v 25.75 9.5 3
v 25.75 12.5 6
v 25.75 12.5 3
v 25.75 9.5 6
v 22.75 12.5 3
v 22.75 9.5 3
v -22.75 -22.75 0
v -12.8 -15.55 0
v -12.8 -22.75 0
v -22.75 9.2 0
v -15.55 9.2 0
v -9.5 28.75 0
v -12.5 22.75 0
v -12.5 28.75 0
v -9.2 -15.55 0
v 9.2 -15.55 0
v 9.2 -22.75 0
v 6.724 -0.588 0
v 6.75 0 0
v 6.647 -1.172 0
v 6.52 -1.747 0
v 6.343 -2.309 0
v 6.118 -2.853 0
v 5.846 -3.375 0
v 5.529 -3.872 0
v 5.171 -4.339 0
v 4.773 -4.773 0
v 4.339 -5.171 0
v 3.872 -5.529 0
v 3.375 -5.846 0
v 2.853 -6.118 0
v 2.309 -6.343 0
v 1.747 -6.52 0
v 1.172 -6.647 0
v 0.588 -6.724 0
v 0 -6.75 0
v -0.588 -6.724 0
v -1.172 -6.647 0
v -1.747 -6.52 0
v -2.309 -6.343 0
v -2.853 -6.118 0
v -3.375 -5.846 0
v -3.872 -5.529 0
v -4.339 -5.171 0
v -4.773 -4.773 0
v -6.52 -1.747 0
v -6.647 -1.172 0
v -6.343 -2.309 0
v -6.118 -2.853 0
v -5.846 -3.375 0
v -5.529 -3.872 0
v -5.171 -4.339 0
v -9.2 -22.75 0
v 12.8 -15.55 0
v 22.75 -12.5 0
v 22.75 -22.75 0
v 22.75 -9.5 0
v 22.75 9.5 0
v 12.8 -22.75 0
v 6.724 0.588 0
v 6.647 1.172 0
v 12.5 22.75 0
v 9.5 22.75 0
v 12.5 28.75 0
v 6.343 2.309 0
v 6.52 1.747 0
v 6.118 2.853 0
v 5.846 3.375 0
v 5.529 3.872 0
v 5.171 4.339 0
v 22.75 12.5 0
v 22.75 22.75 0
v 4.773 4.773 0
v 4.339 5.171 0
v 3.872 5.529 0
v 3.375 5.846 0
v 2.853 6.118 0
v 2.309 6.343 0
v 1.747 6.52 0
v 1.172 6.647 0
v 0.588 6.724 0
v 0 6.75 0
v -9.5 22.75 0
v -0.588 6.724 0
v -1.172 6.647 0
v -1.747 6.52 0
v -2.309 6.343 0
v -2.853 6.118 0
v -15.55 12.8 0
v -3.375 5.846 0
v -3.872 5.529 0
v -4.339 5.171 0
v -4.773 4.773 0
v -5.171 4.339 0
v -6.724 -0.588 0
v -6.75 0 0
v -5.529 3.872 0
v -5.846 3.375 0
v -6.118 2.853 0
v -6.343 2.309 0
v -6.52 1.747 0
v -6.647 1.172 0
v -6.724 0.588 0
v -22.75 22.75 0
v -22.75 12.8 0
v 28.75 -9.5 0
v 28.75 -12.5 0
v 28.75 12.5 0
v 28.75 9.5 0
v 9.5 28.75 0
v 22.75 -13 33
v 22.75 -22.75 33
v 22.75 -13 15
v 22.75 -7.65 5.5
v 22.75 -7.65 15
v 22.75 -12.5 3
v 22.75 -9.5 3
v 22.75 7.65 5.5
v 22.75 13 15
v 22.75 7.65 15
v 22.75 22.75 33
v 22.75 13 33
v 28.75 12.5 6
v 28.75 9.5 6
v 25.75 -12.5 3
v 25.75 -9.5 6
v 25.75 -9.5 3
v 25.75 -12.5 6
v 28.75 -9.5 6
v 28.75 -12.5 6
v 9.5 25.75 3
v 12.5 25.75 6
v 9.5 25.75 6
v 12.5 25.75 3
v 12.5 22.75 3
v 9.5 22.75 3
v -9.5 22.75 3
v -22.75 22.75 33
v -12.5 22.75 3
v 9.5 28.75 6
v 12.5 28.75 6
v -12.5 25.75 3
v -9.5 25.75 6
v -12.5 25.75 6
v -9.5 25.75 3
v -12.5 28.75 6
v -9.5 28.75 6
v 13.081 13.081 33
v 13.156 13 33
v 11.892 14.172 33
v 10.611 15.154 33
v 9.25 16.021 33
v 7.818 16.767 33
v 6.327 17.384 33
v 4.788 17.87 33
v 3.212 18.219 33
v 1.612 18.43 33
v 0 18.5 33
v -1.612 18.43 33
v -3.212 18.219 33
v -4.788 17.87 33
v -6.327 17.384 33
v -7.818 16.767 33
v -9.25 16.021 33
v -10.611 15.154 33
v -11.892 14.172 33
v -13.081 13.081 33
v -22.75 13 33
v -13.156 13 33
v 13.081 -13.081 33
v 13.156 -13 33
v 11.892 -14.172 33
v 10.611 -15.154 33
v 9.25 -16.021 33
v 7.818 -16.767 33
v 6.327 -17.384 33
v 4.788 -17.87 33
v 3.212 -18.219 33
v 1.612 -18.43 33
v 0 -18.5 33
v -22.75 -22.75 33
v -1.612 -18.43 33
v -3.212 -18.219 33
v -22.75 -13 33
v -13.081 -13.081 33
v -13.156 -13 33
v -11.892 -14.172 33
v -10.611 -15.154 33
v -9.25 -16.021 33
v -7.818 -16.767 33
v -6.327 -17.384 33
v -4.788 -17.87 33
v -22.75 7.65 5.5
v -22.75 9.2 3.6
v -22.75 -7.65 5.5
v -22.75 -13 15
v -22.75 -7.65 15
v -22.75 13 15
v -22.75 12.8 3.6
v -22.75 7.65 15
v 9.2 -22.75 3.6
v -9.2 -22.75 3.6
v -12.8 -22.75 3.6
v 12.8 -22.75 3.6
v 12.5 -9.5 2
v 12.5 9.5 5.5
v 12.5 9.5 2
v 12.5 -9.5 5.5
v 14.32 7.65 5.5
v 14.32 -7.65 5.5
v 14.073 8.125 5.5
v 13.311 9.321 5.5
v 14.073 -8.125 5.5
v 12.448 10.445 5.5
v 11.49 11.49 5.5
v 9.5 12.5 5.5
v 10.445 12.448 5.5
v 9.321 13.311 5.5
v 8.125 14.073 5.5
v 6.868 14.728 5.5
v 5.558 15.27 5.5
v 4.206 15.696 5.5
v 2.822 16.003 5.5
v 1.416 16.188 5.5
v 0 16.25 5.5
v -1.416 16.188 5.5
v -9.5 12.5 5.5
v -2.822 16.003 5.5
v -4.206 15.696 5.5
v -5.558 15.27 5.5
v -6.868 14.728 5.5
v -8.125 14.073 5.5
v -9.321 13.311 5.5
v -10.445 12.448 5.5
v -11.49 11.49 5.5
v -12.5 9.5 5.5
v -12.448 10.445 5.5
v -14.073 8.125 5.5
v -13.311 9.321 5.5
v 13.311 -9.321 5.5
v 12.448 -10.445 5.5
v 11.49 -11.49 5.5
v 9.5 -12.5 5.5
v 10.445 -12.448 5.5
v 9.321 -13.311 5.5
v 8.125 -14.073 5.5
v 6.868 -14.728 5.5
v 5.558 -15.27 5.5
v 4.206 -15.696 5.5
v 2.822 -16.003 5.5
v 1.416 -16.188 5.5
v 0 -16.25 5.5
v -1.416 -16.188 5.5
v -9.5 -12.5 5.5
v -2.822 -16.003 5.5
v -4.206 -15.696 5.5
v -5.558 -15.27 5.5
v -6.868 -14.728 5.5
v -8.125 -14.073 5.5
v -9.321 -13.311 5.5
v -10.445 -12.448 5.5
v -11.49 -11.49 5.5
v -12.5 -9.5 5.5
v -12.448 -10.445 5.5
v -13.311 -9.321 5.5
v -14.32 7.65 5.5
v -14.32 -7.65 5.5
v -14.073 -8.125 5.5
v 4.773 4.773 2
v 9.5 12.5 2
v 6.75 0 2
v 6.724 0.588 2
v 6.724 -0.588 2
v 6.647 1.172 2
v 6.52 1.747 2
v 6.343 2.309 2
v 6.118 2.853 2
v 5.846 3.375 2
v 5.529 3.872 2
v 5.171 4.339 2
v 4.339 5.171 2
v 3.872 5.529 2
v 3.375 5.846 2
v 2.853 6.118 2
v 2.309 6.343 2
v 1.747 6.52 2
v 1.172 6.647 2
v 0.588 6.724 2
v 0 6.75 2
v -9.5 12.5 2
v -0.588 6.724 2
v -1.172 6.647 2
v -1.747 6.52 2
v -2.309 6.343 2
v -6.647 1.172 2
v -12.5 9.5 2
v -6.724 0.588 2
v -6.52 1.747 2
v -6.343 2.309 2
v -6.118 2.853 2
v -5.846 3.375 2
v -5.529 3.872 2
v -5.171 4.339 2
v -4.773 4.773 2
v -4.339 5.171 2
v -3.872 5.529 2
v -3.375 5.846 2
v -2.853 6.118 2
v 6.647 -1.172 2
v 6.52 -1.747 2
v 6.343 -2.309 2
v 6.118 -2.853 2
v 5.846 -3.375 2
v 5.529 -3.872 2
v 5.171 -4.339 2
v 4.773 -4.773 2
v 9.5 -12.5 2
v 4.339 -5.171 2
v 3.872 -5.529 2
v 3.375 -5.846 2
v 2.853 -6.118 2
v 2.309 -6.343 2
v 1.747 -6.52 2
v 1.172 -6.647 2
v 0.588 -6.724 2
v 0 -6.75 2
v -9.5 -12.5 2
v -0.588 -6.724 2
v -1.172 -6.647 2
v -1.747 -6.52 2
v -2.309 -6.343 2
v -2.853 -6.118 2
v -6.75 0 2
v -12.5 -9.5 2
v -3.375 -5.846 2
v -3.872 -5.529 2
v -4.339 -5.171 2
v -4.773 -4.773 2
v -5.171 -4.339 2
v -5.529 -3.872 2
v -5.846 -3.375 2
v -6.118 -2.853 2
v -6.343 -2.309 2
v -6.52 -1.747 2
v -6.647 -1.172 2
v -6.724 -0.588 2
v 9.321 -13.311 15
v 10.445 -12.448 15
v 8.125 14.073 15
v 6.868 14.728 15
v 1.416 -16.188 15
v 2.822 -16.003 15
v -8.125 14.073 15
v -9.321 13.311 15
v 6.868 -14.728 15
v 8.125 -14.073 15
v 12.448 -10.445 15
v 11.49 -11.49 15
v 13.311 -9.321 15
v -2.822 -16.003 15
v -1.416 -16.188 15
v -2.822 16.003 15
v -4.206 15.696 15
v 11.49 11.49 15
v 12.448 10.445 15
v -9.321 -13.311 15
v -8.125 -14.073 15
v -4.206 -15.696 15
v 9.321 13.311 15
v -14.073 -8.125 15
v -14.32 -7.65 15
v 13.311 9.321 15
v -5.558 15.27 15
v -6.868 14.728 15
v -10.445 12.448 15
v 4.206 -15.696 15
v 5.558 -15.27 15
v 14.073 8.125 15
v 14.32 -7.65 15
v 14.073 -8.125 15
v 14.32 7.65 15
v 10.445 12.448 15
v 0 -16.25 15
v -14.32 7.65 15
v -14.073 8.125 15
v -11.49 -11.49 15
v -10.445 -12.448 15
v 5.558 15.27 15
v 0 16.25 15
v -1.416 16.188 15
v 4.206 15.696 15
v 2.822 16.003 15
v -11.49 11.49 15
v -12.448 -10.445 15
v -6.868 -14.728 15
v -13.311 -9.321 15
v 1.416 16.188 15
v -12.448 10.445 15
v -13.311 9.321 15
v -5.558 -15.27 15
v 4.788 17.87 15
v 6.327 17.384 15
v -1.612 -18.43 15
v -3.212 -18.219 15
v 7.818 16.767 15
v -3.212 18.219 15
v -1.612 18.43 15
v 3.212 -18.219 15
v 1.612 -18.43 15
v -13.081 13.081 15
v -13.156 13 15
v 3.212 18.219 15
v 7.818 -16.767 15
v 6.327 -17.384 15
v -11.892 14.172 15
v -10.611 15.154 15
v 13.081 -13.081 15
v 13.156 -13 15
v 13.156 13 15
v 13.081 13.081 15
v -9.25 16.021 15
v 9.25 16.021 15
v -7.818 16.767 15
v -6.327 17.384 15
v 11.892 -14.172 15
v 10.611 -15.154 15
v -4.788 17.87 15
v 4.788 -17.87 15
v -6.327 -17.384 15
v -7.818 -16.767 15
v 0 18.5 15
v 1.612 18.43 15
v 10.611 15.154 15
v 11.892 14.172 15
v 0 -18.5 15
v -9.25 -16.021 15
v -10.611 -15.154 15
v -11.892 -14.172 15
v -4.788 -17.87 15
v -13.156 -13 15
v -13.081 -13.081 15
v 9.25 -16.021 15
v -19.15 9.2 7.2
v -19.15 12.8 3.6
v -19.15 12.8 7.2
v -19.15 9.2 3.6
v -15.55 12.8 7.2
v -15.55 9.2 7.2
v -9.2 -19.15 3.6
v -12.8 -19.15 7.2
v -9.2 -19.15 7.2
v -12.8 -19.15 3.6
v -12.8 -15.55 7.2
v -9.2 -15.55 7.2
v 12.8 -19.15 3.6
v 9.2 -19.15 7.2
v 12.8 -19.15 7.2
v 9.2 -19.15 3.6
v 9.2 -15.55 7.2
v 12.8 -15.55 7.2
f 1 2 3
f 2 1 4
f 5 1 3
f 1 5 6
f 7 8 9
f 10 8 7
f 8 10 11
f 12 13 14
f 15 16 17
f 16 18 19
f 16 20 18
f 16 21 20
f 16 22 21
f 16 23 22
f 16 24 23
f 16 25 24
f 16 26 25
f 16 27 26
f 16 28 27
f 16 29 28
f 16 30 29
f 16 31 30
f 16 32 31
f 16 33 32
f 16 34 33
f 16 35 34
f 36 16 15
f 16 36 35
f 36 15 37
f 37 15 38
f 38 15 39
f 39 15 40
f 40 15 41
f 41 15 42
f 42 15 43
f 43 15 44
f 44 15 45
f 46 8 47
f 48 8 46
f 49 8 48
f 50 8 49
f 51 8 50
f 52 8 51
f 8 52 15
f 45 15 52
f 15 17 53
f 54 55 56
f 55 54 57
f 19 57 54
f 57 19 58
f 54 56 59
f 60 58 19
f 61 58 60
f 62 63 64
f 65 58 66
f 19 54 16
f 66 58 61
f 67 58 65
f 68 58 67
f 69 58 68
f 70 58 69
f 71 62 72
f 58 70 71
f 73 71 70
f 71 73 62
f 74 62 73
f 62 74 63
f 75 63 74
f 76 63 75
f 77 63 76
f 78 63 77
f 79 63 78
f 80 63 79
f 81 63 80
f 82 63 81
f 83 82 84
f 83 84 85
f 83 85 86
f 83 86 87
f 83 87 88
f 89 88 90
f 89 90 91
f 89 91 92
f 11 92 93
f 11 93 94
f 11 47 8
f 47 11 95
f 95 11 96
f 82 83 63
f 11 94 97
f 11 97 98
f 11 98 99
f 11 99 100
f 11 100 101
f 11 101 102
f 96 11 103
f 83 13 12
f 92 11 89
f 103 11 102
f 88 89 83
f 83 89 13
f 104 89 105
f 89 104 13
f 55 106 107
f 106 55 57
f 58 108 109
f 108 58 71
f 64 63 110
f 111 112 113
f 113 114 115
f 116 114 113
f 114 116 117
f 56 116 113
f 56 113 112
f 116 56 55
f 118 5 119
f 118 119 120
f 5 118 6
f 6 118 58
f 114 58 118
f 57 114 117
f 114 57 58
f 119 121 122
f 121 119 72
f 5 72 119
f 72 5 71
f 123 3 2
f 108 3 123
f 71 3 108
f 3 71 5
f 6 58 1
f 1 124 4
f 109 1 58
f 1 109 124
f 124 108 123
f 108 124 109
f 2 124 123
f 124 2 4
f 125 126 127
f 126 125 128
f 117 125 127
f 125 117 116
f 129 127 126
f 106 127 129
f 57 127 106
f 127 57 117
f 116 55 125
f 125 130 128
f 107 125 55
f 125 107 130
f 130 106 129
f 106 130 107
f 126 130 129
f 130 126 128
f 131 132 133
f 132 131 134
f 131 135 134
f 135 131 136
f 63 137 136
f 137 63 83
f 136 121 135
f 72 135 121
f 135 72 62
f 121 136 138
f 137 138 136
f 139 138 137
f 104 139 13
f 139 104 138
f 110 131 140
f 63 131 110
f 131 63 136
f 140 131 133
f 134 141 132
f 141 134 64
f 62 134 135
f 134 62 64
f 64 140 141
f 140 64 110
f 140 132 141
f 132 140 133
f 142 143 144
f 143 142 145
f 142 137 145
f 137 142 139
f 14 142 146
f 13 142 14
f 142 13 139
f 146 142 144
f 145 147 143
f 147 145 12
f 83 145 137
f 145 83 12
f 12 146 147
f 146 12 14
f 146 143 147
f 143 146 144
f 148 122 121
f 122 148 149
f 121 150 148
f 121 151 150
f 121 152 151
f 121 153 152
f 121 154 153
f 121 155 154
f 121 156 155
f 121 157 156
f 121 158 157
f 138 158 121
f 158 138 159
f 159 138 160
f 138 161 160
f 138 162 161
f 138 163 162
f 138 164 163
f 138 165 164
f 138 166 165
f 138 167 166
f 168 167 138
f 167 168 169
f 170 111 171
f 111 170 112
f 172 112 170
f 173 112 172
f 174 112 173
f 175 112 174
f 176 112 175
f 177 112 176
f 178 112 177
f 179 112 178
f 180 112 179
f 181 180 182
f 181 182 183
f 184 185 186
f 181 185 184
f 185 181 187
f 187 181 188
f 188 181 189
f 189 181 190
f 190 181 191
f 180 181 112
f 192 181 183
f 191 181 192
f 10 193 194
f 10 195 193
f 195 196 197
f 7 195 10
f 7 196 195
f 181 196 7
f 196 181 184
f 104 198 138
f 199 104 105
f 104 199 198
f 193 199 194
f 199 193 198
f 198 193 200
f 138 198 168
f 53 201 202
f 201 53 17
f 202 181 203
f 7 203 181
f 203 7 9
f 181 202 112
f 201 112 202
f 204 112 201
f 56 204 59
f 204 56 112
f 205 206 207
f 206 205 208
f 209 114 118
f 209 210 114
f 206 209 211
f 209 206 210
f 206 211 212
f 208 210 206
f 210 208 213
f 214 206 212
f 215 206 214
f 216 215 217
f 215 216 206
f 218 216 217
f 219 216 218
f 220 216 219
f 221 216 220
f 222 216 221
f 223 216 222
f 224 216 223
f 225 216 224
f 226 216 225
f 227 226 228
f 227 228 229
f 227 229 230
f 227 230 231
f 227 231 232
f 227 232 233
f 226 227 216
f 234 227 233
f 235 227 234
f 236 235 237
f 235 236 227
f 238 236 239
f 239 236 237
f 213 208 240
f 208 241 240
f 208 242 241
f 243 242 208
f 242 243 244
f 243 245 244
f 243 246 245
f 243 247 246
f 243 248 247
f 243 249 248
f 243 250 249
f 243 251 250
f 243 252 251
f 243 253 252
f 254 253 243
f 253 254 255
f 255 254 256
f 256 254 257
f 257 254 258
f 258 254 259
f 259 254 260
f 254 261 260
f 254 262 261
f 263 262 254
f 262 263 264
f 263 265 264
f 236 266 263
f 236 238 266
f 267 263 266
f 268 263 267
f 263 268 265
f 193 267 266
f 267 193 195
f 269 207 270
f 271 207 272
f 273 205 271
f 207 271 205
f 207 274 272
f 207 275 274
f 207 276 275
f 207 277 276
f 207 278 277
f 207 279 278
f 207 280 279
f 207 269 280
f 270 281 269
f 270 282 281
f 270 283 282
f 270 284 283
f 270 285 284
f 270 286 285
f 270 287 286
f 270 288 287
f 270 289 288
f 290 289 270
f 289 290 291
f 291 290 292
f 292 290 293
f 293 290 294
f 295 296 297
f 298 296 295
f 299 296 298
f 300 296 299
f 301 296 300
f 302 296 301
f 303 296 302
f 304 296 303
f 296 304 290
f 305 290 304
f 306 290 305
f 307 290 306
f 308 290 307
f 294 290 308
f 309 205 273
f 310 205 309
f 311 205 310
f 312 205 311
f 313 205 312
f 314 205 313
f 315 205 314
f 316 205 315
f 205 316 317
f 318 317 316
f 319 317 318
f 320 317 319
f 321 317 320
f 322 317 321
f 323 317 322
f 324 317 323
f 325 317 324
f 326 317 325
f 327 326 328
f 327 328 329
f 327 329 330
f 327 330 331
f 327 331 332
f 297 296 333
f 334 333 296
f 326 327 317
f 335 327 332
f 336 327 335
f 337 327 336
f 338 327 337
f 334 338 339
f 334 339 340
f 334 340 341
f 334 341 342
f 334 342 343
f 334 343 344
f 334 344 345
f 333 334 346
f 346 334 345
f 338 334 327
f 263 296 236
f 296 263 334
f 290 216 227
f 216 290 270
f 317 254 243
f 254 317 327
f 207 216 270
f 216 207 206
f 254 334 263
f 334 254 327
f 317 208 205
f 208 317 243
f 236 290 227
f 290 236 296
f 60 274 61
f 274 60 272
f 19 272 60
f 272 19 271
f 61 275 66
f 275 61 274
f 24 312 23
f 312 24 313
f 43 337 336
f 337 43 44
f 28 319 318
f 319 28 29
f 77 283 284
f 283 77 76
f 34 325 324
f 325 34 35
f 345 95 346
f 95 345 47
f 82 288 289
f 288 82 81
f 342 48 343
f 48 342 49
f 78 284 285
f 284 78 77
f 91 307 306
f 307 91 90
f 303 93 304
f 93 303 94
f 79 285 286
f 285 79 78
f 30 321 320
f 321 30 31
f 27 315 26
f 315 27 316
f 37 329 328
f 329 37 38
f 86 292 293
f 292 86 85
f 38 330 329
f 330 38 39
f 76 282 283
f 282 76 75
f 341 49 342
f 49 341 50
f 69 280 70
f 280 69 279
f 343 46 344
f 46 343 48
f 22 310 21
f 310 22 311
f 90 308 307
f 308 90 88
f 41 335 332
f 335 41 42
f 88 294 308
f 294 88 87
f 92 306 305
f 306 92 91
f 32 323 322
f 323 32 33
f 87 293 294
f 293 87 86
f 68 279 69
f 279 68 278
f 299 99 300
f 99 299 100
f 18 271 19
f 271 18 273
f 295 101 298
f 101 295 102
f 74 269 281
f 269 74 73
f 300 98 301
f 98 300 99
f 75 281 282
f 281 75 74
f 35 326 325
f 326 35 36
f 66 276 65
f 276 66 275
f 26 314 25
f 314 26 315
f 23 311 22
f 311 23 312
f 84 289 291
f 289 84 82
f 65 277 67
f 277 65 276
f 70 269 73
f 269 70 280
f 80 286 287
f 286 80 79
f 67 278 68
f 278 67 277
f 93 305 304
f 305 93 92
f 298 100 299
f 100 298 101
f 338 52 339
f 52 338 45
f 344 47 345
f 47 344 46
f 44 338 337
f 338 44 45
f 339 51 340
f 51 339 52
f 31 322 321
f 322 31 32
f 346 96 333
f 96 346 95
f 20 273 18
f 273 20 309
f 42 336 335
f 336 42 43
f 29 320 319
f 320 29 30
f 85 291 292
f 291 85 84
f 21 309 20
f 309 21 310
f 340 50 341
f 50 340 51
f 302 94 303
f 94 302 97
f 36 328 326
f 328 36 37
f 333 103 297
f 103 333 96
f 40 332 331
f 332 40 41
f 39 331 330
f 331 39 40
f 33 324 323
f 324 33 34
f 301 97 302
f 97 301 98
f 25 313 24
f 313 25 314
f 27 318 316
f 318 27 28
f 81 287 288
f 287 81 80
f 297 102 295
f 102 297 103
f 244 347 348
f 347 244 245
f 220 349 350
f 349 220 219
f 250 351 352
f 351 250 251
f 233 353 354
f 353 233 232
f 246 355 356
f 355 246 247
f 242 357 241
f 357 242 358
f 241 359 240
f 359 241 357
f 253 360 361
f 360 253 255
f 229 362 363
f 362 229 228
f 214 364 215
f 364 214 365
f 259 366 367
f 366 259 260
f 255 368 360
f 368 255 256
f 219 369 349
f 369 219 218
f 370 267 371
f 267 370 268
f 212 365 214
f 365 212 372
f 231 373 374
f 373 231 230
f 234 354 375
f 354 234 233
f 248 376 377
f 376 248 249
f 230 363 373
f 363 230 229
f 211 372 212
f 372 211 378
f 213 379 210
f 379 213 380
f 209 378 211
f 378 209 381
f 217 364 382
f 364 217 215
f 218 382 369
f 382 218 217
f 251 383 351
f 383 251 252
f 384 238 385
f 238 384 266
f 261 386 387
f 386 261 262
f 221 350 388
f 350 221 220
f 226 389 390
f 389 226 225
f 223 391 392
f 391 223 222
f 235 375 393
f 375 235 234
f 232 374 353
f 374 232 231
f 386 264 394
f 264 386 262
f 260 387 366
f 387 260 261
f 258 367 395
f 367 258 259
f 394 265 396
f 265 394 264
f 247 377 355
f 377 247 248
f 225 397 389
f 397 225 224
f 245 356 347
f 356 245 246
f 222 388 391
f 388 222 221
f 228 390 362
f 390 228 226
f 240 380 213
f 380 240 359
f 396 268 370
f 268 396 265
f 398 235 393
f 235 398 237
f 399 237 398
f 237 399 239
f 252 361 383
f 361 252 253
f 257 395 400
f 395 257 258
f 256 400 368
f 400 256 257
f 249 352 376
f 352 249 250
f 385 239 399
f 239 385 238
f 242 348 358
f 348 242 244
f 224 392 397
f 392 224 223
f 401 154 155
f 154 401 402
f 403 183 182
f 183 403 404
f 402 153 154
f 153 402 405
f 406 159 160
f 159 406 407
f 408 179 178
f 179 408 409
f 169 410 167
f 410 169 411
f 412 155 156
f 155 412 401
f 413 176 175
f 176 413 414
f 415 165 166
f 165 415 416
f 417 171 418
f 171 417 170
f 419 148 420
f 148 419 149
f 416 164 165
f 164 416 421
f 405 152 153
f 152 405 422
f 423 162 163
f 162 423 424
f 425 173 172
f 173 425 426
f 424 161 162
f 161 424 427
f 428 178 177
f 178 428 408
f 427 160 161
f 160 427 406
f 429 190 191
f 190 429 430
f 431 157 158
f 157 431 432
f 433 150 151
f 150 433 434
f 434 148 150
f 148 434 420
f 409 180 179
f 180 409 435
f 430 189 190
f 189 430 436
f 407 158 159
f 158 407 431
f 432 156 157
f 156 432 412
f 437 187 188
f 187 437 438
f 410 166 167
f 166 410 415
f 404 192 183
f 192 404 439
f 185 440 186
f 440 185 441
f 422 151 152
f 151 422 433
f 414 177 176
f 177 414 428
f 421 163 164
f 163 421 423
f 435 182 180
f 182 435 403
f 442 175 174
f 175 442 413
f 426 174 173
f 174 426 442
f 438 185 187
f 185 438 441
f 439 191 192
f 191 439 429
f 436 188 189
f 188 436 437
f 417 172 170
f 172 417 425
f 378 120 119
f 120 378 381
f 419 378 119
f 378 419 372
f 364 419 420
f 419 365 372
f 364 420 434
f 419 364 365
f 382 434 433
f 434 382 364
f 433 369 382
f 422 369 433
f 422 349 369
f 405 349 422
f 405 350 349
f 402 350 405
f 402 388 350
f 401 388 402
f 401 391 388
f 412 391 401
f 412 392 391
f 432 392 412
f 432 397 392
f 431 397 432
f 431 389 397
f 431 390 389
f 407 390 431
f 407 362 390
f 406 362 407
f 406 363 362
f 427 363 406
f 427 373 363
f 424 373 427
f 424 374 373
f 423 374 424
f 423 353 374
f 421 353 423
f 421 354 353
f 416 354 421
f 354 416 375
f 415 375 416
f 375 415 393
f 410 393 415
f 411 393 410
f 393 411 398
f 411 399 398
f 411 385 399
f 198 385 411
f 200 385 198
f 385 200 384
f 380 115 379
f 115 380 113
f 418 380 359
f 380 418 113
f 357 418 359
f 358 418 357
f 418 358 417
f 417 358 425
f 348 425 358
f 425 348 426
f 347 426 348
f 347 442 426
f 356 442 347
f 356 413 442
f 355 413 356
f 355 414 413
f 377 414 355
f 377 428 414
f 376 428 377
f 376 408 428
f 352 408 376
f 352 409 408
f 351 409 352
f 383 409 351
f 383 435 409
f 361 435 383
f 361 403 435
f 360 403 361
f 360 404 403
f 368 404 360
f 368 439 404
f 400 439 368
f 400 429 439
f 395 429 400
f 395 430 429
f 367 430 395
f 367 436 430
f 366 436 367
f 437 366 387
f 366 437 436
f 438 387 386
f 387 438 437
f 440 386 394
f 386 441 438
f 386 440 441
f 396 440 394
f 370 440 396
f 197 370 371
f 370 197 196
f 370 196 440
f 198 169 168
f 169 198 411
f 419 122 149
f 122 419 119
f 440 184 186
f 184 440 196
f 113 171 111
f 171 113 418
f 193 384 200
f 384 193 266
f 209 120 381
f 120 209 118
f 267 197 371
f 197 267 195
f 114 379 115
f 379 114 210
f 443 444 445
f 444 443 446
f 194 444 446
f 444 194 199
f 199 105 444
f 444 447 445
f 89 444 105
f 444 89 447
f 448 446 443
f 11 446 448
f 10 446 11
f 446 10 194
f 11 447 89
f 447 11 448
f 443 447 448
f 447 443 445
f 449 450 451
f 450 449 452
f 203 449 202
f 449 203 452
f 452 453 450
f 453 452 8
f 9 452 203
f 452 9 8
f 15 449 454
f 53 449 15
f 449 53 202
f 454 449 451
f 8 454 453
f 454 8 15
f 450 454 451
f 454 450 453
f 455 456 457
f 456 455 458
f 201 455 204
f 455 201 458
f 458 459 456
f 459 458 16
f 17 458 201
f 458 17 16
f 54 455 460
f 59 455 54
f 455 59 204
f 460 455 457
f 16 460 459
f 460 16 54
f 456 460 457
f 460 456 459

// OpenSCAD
// dimensions
box_width               = 45.5;
half_box_width          = box_width/2;
box_height              = 33;
hook_offset             = 11;
loop_offset             = hook_offset;
square_hole_width       = 25;
square_hole_height      = 3.5;
square_hole_offset      = 2;
triangle_corner_size    = 3;

triangle_vertices = [
[0,0,0],                                        // 0
[triangle_corner_size,0,0],                     // 1
[0,triangle_corner_size,0],                     // 2
[0,0,square_hole_height],                       // 3
[triangle_corner_size,0,square_hole_height],    // 4
[0,triangle_corner_size,square_hole_height]];   // 5

triangle_faces = [
[0,1,2],
[0,2,5,3],
[2,1,4,5],
[1,0,3,4],
[3,5,4]];

module hole()
{
    // dimensions
    num_circle_faces        = 72;
    center_hole_diameter    = 13.5;
    main_hole_diameter      = 32.5;
    main_hole_height        = 27.5;
    wash_hole_diameter      = 37;
    wash_hole_height        = 18;
    
    // center hole
    cylinder(box_height,d1=center_hole_diameter,d2=center_hole_diameter, $fn=num_circle_faces);  
    
    // square hole 
    difference() {
        // square hole
        translate([-(square_hole_width/2),-(square_hole_width/2),square_hole_offset]) 
        cube([square_hole_width,square_hole_width,square_hole_height]);
        // cut corner 0
        translate([(square_hole_width/2),(square_hole_width/2),square_hole_offset]) 
        rotate([0,0,180]) 
        polyhedron(triangle_vertices,triangle_faces);
        // cut corner 1
        translate([-(square_hole_width/2),-(square_hole_width/2),square_hole_offset]) 
        rotate([0,0,0]) 
        polyhedron(triangle_vertices,triangle_faces);
        // cut corner 2
        translate([(square_hole_width/2),-(square_hole_width/2),square_hole_offset]) 
        rotate([0,0,90]) 
        polyhedron(triangle_vertices,triangle_faces);
        // cut corner 3
        translate([-(square_hole_width/2),(square_hole_width/2),square_hole_offset]) 
        rotate([0,0,-90]) 
        polyhedron(triangle_vertices,triangle_faces);
    }  
    
    // main paint hole
    translate([0,0,box_height - main_hole_height])
    cylinder(main_hole_height,d1=main_hole_diameter,d2=main_hole_diameter, $fn=num_circle_faces);
    
    // wash hole
    translate([0,0,box_height - wash_hole_height])
    cylinder(wash_hole_height,d1=wash_hole_diameter,d2=wash_hole_diameter, $fn=num_circle_faces);
}

module cutout()
{
    top_cutout_height=18;
    top_cutout_width=26;
    bottom_cutout_height=9.5;
    bottom_cutout_width=15.3;
    
    // top cutout
    translate([-half_box_width, -(top_cutout_width/2), box_height - top_cutout_height])
    cube([box_width, top_cutout_width, top_cutout_height]);
    
    // bottom cutout
    translate([-half_box_width, -(bottom_cutout_width/2), box_height - top_cutout_height - bottom_cutout_height])
    cube([box_width, bottom_cutout_width, bottom_cutout_height]);
}

module hook()
{
    width = 3;
    union()
    {
        translate([0, -(width/2), 0])
        cube([width,width,width]);
        translate([width, -(width/2), 0])
        cube([width,width,2*width]);
    }
}

module hooks()
{
    translate([half_box_width, hook_offset, 0])
    hook();
    translate([half_box_width, -hook_offset, 0])
    hook();
    translate([hook_offset, half_box_width, 0])
    rotate(90)
    hook();
    translate([-hook_offset, half_box_width, 0])
    rotate(90)
    hook();
}

module loop()
{
    width = 3.6;
    union()
    {
        translate([0, -(width/2), 0])
        cube([width,width,width]);
        translate([width, -(width/2), 0])
        cube([width,width,2*width]);
    }
}

module loops()
{
    translate([-half_box_width, loop_offset, 0])
    loop();
    translate([-half_box_width, loop_offset, 0])
    loop();
    translate([-loop_offset, -half_box_width, 0])
    rotate(90)
    loop();
    translate([loop_offset, -half_box_width, 0])
    rotate(90)
    loop();
}

module box()
{
    translate([-box_width/2,-box_width/2,0])
    cube([box_width, box_width, box_height]);
}

// ACTUAL DESIGN IMPLEMENTATION
module paint_holder()
{
    difference()
    {
        union()
        {
            box();
            hooks();
        }
        union()
        {
            hole();
            cutout();
            loops();
        }
    }
}

paint_holder();
